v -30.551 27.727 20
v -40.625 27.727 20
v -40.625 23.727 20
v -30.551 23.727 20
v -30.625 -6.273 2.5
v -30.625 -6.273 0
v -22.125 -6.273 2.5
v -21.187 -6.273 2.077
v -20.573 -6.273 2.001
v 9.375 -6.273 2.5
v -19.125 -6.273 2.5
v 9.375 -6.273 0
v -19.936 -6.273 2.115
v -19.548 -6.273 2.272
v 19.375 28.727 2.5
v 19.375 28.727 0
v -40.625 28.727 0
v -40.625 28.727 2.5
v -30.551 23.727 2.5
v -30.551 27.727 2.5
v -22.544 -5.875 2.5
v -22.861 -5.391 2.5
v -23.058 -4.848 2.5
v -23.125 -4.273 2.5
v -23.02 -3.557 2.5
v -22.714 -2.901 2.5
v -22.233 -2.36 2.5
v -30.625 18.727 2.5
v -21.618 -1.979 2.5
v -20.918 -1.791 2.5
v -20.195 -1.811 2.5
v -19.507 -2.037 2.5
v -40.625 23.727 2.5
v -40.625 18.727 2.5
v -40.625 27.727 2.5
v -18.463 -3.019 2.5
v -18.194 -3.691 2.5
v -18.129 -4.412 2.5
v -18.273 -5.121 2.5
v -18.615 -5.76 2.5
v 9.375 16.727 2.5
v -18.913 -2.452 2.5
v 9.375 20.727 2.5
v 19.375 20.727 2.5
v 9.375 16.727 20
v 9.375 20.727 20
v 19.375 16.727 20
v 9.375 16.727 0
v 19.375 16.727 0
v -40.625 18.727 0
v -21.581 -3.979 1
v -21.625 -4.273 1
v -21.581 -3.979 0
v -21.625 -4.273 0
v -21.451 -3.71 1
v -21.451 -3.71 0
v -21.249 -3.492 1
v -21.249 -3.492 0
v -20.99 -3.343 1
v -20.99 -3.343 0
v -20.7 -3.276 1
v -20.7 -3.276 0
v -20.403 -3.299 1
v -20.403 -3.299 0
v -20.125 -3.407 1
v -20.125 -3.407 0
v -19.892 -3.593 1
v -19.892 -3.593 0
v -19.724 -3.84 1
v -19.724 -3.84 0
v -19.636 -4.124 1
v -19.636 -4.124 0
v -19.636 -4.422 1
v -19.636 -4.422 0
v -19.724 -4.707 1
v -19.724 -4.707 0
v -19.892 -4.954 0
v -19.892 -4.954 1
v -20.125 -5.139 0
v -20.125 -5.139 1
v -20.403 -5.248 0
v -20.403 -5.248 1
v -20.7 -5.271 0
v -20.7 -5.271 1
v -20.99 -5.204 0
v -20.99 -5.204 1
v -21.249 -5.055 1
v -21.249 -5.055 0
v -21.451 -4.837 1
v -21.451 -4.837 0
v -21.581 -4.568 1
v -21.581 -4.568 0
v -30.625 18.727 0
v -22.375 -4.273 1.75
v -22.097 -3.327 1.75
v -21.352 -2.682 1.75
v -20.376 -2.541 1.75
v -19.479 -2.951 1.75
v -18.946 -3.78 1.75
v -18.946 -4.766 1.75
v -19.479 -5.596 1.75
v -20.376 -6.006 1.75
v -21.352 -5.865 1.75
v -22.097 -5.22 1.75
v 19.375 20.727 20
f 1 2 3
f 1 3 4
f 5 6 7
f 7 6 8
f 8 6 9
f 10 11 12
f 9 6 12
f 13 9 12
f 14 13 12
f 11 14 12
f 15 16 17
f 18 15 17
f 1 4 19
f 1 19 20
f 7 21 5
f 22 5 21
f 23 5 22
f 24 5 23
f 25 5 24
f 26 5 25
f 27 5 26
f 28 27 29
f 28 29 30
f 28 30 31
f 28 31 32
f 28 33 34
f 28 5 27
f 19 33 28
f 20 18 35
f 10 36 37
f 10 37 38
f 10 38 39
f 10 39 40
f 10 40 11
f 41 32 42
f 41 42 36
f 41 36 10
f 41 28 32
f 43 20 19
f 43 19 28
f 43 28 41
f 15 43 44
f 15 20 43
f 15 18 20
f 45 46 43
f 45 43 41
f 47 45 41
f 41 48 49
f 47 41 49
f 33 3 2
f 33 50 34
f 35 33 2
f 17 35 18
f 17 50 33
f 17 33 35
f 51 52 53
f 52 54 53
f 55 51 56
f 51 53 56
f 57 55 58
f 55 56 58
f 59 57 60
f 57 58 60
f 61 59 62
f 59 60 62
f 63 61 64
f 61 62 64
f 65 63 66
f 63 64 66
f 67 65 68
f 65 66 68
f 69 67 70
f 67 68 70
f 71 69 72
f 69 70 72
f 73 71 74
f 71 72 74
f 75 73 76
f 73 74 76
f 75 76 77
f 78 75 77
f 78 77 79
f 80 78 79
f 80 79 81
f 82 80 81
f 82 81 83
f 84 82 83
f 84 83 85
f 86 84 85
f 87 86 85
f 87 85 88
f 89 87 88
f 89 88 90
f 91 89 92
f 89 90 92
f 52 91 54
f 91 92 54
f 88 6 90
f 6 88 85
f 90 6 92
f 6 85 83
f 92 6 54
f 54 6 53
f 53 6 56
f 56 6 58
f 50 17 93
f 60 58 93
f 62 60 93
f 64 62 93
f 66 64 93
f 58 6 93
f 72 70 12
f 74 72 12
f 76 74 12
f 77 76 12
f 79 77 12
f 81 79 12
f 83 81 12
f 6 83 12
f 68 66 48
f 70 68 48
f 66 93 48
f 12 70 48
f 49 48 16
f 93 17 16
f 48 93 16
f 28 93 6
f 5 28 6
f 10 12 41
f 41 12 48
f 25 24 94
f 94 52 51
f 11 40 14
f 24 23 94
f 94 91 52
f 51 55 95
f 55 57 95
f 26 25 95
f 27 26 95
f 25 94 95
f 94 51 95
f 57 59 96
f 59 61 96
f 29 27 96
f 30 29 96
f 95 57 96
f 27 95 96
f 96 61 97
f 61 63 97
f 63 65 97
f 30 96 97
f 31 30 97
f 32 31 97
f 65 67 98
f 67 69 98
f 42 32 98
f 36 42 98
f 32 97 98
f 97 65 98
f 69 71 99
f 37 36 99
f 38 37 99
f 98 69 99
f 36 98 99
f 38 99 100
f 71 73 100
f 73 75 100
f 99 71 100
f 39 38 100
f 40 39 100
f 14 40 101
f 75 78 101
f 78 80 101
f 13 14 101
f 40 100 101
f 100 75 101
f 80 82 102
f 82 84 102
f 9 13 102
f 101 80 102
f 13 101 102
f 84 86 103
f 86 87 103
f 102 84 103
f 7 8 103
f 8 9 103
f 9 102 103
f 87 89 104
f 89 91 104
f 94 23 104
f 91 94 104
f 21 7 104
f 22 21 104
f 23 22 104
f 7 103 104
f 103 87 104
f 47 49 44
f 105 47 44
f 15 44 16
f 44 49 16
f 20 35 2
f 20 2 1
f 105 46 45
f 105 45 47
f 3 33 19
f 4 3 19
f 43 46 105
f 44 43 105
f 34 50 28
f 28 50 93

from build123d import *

# Parameters (mm, degrees)
F1_DEPTH       = 2.5
F0_W           = 10.07359
F0_H           = 4
F0_W_2         = 10
F0_H_2         = 2
F2_DEPTH       = 20
F4_D           = 2
F4_CSINK_D     = 5
F4_CSINK_ANGLE = 90


with BuildPart() as f1:
    # F0 (on Top) → F1 (new body)
    with BuildSketch(Plane.XY):
        Polygon((9.374975, 18.726558), (-30.625025, 18.726558), (-30.625025, -6.273442), (9.374975, -6.273442), (9.374975, 16.726558), align=None)
        Polygon((-40.625025, 18.726558), (-30.625025, 18.726558), (9.374975, 18.726558), (9.374975, 20.726558), (19.374975, 20.726558), (19.374975, 28.726558), (-40.625025, 28.726558), (-40.625025, 27.726558), (-30.551435, 27.726558), (-30.551435, 23.726558), (-40.625025, 23.726558), align=None)
    extrude(amount=F1_DEPTH)

    # F0 (on Top) → F2 (join)
    with BuildSketch(Plane.XY):
        with Locations((-35.58823, 25.726558)):
            Rectangle(F0_W, F0_H)
        with Locations((14.374975, 19.726558)):
            Rectangle(F0_W_2, F0_H_2)
        with Locations((14.374975, 17.726558)):
            Rectangle(F0_W_2, F0_H_2)
    extrude(amount=F2_DEPTH)

    # F4 (through all)
    with Locations(Plane.XY.offset(2.5)):
        with Locations((-20.625025, -4.273442)):
            CounterSinkHole(F4_D / 2, F4_CSINK_D / 2, counter_sink_angle=F4_CSINK_ANGLE)


solid = f1.part
